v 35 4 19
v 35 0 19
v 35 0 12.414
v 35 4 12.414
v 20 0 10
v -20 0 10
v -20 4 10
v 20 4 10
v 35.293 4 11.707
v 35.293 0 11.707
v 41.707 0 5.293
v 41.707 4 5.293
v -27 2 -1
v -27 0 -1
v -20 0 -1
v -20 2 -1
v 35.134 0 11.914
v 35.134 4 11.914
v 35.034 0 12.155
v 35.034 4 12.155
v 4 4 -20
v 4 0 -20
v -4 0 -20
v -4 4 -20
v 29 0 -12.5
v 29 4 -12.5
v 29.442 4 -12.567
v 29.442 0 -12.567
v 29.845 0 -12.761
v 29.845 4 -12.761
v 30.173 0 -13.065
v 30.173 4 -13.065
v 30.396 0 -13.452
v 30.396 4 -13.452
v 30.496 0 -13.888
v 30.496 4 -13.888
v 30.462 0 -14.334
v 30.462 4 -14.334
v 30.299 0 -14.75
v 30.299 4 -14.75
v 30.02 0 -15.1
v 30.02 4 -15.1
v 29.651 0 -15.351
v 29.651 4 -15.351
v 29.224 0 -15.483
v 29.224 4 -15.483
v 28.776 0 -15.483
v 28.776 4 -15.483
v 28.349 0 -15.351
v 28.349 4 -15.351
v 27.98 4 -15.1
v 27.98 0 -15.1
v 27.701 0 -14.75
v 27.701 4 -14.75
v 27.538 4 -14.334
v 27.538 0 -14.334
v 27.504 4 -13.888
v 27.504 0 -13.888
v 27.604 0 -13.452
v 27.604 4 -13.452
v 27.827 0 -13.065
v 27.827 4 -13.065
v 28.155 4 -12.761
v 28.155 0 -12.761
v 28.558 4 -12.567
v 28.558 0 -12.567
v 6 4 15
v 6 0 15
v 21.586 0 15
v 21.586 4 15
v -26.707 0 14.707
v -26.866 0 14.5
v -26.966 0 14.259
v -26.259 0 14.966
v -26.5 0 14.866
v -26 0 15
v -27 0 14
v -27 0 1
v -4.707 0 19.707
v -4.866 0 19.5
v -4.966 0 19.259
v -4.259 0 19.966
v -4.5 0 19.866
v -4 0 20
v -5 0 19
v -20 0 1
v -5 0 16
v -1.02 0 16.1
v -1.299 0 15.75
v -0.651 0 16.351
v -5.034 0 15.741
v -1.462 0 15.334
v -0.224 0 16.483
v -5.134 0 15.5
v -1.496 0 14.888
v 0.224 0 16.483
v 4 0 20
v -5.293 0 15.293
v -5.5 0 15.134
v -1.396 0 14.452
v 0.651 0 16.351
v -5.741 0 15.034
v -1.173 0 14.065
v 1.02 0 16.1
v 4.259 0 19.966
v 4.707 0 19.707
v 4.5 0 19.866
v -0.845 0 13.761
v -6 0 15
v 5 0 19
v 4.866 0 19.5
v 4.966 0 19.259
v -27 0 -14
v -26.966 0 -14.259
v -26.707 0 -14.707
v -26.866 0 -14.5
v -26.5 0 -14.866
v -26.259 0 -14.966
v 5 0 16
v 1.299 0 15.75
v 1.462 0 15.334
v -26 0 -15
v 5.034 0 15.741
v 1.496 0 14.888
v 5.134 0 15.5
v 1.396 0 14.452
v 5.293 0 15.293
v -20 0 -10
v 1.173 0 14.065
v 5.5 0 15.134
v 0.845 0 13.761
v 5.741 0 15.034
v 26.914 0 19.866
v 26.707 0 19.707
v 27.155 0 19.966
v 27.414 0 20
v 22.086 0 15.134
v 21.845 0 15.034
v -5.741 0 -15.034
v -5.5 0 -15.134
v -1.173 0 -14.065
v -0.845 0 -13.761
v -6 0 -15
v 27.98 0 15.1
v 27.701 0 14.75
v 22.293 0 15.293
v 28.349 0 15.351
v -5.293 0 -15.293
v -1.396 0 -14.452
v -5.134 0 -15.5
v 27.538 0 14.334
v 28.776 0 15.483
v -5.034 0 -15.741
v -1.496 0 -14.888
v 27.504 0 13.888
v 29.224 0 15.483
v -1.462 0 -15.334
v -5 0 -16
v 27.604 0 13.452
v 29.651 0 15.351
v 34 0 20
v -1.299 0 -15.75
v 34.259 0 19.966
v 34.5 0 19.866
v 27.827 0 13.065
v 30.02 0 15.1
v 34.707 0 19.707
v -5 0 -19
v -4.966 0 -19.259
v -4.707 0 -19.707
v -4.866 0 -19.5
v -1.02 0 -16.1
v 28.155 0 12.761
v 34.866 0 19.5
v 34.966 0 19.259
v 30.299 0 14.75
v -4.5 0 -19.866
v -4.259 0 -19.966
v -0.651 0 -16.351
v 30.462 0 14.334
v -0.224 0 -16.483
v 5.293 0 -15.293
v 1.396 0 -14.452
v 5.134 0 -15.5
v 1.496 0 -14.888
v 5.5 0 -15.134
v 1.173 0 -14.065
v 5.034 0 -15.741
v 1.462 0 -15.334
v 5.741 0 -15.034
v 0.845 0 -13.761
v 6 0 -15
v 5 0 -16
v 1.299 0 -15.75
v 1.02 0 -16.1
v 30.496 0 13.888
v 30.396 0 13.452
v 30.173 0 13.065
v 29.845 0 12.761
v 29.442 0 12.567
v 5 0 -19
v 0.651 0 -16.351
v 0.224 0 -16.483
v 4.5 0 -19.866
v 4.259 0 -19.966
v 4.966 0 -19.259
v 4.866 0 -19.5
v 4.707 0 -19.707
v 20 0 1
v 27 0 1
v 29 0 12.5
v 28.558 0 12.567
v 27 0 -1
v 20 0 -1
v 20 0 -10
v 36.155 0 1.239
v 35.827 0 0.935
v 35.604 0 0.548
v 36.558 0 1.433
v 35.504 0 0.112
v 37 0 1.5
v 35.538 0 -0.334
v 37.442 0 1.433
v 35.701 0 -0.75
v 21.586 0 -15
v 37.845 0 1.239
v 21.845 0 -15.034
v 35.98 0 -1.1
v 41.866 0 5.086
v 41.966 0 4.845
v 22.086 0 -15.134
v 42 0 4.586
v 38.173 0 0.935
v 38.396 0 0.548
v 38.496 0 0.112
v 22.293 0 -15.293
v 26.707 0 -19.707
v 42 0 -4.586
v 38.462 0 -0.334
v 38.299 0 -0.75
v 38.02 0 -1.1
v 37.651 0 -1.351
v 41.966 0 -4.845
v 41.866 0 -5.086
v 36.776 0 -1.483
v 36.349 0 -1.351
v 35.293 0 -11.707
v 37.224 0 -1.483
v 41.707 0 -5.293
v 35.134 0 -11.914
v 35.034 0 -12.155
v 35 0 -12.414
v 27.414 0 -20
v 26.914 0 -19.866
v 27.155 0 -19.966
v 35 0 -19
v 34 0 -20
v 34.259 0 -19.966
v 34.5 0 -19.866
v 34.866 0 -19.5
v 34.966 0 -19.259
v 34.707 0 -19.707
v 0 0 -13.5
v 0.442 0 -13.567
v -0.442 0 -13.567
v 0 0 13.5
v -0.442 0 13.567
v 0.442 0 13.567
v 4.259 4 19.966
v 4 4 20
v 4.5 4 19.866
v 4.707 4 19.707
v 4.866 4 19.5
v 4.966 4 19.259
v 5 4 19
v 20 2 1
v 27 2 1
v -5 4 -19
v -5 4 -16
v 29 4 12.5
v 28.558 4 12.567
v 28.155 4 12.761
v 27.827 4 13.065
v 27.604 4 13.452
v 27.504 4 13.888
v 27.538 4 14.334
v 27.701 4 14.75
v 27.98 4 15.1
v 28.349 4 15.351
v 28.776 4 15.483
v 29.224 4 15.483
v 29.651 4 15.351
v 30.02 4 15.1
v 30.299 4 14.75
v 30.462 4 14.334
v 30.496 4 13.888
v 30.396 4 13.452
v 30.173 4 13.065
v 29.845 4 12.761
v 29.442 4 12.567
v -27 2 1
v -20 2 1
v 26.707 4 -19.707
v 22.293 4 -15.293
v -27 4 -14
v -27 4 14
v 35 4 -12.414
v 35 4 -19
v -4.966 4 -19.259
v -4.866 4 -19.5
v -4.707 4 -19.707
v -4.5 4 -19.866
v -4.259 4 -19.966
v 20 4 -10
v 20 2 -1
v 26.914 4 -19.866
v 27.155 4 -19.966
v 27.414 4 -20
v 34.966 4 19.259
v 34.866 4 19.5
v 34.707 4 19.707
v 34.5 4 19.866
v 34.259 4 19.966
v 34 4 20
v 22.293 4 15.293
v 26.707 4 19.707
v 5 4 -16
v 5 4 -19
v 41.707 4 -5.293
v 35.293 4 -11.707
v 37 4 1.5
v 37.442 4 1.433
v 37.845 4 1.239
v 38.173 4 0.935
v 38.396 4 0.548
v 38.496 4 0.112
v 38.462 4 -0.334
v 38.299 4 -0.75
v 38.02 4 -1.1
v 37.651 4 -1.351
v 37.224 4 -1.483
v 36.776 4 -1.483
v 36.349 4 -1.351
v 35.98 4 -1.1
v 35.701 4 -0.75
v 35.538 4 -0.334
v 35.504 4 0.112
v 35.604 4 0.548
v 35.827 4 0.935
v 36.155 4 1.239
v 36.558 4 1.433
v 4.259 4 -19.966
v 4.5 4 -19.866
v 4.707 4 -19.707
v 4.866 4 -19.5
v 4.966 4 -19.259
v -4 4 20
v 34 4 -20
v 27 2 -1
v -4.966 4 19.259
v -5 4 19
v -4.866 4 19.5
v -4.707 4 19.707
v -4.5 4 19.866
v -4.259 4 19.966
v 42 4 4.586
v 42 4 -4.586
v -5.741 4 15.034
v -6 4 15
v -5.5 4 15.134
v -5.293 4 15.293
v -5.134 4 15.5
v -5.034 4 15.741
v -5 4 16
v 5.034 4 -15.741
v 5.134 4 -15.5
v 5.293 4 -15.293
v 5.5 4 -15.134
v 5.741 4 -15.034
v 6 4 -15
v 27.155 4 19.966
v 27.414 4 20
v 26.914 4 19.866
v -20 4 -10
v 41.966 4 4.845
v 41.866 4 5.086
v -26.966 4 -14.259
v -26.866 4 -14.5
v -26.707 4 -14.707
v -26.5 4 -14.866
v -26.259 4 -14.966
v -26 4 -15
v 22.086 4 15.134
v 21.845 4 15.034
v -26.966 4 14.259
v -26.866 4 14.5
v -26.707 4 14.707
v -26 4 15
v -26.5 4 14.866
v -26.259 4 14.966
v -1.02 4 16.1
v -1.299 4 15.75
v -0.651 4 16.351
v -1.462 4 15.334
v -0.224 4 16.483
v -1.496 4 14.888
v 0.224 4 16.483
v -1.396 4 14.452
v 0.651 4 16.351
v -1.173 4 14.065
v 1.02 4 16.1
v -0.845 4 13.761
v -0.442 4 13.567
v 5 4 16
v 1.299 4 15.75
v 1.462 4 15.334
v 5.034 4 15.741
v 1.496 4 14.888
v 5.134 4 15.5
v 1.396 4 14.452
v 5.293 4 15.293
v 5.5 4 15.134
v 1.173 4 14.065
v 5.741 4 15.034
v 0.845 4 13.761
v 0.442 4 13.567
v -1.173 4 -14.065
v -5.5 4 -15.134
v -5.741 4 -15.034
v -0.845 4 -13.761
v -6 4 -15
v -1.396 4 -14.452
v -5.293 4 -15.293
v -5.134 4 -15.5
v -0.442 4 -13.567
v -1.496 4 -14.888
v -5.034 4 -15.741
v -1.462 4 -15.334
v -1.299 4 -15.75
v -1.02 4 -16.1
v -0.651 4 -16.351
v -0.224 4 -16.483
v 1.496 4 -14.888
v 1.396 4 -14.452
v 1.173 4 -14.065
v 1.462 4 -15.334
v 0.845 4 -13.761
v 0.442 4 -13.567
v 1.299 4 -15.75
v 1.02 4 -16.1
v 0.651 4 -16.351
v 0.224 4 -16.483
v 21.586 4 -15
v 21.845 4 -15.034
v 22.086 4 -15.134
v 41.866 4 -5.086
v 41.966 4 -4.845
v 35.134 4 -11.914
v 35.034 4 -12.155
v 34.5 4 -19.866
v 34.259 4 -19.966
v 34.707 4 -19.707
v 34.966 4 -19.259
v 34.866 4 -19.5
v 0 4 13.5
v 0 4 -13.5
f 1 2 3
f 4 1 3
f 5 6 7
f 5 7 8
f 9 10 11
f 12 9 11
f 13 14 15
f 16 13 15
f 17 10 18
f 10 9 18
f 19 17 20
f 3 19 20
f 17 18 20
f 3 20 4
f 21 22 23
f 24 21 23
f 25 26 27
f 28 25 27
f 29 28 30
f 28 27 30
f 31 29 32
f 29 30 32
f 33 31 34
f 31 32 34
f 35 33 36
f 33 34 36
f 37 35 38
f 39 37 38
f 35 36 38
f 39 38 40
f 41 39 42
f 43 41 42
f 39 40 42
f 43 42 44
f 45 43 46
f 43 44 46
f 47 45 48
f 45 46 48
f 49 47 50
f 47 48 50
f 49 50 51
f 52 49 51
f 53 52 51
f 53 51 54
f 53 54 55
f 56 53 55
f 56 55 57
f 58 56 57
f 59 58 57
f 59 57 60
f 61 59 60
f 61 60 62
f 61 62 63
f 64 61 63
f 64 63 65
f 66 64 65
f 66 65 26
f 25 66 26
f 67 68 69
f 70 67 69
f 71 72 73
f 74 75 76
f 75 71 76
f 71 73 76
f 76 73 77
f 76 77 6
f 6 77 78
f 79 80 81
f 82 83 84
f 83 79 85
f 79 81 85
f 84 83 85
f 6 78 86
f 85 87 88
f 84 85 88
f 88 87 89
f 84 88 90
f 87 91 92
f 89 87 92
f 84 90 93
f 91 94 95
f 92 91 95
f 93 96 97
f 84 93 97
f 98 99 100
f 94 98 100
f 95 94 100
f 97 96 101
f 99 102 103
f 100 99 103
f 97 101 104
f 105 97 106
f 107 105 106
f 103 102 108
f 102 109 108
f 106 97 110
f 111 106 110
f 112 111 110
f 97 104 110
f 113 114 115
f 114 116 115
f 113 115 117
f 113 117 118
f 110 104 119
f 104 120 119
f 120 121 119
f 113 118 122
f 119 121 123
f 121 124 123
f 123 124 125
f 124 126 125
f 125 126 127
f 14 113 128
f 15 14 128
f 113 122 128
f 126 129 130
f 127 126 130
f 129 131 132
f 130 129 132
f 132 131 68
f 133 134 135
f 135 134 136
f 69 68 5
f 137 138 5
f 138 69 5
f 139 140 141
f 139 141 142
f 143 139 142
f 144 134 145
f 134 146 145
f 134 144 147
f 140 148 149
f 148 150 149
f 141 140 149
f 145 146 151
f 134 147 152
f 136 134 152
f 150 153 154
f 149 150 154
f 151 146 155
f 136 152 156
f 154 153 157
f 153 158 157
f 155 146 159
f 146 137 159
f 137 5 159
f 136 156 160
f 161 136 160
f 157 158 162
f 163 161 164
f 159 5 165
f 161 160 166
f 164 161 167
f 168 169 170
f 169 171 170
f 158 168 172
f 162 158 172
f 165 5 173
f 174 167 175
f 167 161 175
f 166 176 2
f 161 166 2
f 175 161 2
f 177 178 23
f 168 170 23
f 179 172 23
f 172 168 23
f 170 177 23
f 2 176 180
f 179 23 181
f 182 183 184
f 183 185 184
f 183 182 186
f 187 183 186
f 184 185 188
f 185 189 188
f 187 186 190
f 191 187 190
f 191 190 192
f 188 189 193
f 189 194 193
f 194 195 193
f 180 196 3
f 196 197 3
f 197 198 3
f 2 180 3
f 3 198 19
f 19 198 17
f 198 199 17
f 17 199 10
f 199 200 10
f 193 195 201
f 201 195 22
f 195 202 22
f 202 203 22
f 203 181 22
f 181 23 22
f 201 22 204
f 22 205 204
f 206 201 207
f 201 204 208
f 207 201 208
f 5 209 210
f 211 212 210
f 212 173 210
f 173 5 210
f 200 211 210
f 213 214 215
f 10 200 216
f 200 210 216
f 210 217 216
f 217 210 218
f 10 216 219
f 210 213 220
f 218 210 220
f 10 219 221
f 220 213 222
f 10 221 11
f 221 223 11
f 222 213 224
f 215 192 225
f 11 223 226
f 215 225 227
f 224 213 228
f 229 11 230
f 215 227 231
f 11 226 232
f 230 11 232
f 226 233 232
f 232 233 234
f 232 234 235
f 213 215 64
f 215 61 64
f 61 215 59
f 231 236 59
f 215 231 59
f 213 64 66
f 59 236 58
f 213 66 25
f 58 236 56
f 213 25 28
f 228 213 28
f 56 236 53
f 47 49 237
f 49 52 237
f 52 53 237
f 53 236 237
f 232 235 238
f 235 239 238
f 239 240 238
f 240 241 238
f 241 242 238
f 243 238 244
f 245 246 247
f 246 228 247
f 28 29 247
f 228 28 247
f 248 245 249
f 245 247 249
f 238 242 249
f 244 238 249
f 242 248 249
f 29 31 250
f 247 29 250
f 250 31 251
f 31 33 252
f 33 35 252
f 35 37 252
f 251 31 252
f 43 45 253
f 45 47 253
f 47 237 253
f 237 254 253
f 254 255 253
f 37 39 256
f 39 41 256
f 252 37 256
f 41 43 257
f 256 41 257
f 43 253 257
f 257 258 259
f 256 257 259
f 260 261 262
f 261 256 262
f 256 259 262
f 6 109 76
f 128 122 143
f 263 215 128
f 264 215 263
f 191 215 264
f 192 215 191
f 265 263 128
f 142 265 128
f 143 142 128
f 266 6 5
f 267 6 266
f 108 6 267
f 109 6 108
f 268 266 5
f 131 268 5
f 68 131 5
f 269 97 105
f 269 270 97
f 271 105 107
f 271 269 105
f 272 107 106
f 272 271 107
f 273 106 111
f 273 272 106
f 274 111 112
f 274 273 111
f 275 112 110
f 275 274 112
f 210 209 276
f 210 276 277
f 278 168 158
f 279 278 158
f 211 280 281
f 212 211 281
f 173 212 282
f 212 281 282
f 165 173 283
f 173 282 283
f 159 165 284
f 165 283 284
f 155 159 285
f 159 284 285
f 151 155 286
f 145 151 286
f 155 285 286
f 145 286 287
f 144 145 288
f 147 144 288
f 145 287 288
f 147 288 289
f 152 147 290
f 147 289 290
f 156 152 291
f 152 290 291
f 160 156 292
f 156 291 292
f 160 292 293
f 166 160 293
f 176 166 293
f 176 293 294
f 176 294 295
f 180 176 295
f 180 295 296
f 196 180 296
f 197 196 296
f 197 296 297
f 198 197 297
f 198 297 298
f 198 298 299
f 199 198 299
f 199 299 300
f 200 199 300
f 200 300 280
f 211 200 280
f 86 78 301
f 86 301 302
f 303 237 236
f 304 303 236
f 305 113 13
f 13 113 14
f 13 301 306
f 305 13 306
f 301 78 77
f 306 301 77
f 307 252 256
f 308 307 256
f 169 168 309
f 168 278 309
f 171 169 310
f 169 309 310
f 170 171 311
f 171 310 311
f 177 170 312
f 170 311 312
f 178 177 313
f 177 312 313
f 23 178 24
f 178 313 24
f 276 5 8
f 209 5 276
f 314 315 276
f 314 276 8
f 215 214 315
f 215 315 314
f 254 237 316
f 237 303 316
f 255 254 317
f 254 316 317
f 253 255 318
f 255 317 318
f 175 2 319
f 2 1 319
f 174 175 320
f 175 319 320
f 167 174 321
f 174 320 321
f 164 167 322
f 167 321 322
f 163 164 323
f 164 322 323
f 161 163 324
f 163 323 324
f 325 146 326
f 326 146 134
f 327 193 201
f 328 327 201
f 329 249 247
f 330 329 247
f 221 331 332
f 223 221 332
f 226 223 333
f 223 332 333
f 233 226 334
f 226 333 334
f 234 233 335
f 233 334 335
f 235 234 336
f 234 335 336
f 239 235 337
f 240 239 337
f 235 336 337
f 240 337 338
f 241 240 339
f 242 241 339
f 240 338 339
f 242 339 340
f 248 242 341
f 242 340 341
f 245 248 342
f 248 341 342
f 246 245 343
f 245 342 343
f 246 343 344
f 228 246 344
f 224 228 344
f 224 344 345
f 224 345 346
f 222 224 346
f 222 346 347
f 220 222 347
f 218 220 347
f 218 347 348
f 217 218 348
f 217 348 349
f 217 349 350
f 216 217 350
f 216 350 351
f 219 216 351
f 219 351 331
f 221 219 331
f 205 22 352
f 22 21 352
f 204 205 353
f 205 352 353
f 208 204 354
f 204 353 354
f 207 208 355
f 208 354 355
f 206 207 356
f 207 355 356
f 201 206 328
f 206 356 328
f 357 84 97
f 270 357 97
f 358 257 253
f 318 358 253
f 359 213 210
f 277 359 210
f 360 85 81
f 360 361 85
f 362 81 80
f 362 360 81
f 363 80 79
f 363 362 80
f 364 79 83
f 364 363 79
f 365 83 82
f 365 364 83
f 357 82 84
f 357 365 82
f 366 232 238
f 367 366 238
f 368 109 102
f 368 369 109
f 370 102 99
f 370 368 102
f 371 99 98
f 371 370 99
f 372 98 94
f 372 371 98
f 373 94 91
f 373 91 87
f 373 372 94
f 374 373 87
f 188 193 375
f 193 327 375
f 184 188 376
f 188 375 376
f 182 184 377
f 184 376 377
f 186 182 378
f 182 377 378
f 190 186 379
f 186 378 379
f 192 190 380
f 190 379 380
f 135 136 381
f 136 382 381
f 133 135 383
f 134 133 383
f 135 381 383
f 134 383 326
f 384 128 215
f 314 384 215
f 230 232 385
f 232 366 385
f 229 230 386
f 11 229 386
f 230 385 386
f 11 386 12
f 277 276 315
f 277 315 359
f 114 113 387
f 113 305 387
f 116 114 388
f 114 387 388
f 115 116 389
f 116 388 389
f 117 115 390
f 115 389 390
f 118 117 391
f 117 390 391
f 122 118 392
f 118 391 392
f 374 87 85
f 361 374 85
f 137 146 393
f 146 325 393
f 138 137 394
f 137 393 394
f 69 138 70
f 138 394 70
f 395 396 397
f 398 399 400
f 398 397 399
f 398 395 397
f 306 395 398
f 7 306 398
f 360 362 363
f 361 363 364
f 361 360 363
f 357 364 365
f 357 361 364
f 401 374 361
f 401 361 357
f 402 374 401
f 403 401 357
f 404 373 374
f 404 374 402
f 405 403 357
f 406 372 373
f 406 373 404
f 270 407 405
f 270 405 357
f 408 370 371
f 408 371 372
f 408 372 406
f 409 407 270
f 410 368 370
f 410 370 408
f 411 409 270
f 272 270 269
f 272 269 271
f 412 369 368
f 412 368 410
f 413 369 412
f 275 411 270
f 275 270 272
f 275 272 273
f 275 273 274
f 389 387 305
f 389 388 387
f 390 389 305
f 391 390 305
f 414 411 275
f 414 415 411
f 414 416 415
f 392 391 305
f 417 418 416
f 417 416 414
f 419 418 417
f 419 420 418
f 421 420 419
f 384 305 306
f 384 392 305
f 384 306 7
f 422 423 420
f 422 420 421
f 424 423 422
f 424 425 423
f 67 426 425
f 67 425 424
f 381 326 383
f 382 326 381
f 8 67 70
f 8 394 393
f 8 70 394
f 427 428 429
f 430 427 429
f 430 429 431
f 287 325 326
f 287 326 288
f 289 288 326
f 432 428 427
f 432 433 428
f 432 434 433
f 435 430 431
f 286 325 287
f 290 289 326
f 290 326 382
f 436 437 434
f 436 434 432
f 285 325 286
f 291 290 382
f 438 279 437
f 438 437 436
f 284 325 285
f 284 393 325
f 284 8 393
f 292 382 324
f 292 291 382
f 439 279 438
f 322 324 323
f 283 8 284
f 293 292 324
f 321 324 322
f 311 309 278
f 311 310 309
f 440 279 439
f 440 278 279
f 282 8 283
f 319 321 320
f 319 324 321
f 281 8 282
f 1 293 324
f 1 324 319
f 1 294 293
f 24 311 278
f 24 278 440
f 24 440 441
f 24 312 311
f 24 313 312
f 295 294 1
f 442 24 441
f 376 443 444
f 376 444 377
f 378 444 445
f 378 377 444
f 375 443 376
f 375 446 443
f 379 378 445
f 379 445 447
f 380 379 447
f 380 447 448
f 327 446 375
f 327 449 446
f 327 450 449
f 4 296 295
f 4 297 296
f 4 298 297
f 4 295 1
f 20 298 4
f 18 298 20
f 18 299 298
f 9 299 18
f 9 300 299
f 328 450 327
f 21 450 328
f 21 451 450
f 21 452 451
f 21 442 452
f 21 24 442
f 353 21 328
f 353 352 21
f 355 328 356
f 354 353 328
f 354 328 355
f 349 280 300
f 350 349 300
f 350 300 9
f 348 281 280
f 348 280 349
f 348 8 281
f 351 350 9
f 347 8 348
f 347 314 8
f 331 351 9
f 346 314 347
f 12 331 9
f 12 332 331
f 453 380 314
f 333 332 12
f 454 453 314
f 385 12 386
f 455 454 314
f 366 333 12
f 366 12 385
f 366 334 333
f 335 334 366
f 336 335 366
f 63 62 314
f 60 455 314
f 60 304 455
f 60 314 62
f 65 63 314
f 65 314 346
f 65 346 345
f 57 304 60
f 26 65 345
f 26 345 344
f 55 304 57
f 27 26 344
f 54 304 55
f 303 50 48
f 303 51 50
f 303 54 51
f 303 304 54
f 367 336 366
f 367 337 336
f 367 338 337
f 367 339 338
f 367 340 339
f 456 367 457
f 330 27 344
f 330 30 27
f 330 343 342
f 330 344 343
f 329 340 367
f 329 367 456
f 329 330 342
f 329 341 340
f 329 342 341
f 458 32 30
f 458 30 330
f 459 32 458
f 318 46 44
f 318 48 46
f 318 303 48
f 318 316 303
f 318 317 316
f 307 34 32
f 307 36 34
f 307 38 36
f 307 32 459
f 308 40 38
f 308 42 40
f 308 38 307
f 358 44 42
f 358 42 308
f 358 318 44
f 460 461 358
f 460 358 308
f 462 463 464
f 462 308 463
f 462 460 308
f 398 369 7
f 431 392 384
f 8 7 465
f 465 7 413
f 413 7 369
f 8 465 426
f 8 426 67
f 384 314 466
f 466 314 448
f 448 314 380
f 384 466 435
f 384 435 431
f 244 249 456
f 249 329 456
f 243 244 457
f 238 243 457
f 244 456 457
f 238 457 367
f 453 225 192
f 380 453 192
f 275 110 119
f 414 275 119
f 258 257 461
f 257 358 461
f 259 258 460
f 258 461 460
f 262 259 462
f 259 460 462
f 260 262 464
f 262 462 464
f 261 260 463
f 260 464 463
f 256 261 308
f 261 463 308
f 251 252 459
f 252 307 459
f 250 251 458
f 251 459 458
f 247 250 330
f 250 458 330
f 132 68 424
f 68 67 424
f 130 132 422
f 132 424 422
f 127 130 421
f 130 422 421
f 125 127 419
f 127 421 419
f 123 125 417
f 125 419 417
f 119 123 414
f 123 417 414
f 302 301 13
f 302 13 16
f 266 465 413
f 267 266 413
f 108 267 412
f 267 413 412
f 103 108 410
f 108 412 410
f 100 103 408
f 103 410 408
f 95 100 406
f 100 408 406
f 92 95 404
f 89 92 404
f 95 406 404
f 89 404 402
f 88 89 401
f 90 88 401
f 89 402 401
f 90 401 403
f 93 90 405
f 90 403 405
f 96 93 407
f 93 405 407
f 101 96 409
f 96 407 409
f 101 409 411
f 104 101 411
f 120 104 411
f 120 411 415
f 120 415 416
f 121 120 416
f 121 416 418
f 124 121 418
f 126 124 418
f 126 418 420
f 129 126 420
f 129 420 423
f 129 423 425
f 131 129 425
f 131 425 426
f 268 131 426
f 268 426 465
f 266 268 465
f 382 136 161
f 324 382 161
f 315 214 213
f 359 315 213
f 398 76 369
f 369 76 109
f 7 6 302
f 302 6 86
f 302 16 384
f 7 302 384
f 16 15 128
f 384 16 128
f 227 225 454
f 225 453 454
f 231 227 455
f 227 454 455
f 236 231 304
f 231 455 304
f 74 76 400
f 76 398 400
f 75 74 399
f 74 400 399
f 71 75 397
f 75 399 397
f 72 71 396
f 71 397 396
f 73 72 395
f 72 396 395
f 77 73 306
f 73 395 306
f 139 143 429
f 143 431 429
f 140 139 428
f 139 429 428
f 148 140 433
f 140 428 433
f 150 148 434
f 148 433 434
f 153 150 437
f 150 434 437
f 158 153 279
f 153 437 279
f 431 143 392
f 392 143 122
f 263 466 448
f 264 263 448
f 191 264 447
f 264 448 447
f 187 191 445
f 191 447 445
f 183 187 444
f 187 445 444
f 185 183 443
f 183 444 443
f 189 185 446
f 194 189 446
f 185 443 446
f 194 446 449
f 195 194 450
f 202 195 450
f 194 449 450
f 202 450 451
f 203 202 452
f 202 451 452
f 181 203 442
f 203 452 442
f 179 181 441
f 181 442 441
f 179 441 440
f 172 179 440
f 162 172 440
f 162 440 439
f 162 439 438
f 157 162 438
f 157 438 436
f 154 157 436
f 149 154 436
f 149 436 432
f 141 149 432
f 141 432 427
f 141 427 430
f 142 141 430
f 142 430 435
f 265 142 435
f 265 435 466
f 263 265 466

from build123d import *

# Parameters (mm, degrees)
EXTRUDE_1_OUTLINE_W = 40
EXTRUDE_1_OUTLINE_H = 20
EXTRUDE_1_DEPTH     = 4
SKETCH_2_R          = 1.5
CUT_EXTRUDE_1_DEPTH = 47.69047012
SKETCH_3_W          = 7
SKETCH_3_H          = 2
CUT_EXTRUDE_2_DEPTH = 2
FILLET_1_R          = 1


# Read off the part's stored shape, not the designer's step: 凸台-拉伸1
with BuildPart() as part:
    # 凸台-拉伸1 outline → 凸台-拉伸1 (new body)
    with BuildSketch(Plane(origin=(0, 0, 0), x_dir=(1, 0, 0), z_dir=(0, 1, 0))):
        Polygon((-27, -15), (-5, -15), (-5, -20), (5, -20), (5, -15), (22, -15), (27, -20), (35, -20), (35, -12), (42, -5), (42, 5), (35, 12), (35, 20), (27, 20), (22, 15), (5, 15), (5, 20), (-5, 20), (-5, 15), (-27, 15), align=None)
        Rectangle(EXTRUDE_1_OUTLINE_W, EXTRUDE_1_OUTLINE_H, mode=Mode.SUBTRACT)
    extrude(amount=EXTRUDE_1_DEPTH)

    # 草图2 → 切除-拉伸1 (cut, through all)
    with BuildSketch(Plane(origin=(0, 4, 0), x_dir=(1, 0, 0), z_dir=(0, 1, 0))):
        with Locations(Location((0, 15, 0), (0, 0, 270))):
            Circle(SKETCH_2_R)
        with Locations(Location((0, -15, 0), (0, 0, 90))):
            Circle(SKETCH_2_R)
        with Locations(Location((29, 14, 0), (0, 0, 270))):
            Circle(SKETCH_2_R)
        with Locations(Location((29, -14, 0), (0, 0, 90))):
            Circle(SKETCH_2_R)
        with Locations(Location((37, 0, 0), (0, 0, 270))):
            Circle(SKETCH_2_R)
    extrude(amount=-CUT_EXTRUDE_1_DEPTH, mode=Mode.SUBTRACT)

    # 草图3 → 切除-拉伸2 (cut)
    with BuildSketch(Plane.XZ):
        with Locations((-23.5, 0)):
            Rectangle(SKETCH_3_W, SKETCH_3_H)
        with Locations((23.5, 0)):
            Rectangle(SKETCH_3_W, SKETCH_3_H)
    extrude(amount=-CUT_EXTRUDE_2_DEPTH, mode=Mode.SUBTRACT)

    # 圆角1
    fillet_1_edges = [part.edges().sort_by_distance(p)[0] for p in [
        (-27, 2, 15),
        (-27, 2, -15),
        (-5, 2, -15),
        (-5, 2, -20),
        (5, 2, -20),
        (5, 2, -15),
        (22, 2, -15),
        (27, 2, -20),
        (35, 2, -20),
        (35, 2, -12),
        (42, 2, -5),
        (42, 2, 5),
        (35, 2, 12),
        (35, 2, 20),
        (27, 2, 20),
        (22, 2, 15),
        (5, 2, 15),
        (5, 2, 20),
        (-5, 2, 20),
        (-5, 2, 15),
    ]]
    fillet(fillet_1_edges, radius=FILLET_1_R)


solid = part.part
